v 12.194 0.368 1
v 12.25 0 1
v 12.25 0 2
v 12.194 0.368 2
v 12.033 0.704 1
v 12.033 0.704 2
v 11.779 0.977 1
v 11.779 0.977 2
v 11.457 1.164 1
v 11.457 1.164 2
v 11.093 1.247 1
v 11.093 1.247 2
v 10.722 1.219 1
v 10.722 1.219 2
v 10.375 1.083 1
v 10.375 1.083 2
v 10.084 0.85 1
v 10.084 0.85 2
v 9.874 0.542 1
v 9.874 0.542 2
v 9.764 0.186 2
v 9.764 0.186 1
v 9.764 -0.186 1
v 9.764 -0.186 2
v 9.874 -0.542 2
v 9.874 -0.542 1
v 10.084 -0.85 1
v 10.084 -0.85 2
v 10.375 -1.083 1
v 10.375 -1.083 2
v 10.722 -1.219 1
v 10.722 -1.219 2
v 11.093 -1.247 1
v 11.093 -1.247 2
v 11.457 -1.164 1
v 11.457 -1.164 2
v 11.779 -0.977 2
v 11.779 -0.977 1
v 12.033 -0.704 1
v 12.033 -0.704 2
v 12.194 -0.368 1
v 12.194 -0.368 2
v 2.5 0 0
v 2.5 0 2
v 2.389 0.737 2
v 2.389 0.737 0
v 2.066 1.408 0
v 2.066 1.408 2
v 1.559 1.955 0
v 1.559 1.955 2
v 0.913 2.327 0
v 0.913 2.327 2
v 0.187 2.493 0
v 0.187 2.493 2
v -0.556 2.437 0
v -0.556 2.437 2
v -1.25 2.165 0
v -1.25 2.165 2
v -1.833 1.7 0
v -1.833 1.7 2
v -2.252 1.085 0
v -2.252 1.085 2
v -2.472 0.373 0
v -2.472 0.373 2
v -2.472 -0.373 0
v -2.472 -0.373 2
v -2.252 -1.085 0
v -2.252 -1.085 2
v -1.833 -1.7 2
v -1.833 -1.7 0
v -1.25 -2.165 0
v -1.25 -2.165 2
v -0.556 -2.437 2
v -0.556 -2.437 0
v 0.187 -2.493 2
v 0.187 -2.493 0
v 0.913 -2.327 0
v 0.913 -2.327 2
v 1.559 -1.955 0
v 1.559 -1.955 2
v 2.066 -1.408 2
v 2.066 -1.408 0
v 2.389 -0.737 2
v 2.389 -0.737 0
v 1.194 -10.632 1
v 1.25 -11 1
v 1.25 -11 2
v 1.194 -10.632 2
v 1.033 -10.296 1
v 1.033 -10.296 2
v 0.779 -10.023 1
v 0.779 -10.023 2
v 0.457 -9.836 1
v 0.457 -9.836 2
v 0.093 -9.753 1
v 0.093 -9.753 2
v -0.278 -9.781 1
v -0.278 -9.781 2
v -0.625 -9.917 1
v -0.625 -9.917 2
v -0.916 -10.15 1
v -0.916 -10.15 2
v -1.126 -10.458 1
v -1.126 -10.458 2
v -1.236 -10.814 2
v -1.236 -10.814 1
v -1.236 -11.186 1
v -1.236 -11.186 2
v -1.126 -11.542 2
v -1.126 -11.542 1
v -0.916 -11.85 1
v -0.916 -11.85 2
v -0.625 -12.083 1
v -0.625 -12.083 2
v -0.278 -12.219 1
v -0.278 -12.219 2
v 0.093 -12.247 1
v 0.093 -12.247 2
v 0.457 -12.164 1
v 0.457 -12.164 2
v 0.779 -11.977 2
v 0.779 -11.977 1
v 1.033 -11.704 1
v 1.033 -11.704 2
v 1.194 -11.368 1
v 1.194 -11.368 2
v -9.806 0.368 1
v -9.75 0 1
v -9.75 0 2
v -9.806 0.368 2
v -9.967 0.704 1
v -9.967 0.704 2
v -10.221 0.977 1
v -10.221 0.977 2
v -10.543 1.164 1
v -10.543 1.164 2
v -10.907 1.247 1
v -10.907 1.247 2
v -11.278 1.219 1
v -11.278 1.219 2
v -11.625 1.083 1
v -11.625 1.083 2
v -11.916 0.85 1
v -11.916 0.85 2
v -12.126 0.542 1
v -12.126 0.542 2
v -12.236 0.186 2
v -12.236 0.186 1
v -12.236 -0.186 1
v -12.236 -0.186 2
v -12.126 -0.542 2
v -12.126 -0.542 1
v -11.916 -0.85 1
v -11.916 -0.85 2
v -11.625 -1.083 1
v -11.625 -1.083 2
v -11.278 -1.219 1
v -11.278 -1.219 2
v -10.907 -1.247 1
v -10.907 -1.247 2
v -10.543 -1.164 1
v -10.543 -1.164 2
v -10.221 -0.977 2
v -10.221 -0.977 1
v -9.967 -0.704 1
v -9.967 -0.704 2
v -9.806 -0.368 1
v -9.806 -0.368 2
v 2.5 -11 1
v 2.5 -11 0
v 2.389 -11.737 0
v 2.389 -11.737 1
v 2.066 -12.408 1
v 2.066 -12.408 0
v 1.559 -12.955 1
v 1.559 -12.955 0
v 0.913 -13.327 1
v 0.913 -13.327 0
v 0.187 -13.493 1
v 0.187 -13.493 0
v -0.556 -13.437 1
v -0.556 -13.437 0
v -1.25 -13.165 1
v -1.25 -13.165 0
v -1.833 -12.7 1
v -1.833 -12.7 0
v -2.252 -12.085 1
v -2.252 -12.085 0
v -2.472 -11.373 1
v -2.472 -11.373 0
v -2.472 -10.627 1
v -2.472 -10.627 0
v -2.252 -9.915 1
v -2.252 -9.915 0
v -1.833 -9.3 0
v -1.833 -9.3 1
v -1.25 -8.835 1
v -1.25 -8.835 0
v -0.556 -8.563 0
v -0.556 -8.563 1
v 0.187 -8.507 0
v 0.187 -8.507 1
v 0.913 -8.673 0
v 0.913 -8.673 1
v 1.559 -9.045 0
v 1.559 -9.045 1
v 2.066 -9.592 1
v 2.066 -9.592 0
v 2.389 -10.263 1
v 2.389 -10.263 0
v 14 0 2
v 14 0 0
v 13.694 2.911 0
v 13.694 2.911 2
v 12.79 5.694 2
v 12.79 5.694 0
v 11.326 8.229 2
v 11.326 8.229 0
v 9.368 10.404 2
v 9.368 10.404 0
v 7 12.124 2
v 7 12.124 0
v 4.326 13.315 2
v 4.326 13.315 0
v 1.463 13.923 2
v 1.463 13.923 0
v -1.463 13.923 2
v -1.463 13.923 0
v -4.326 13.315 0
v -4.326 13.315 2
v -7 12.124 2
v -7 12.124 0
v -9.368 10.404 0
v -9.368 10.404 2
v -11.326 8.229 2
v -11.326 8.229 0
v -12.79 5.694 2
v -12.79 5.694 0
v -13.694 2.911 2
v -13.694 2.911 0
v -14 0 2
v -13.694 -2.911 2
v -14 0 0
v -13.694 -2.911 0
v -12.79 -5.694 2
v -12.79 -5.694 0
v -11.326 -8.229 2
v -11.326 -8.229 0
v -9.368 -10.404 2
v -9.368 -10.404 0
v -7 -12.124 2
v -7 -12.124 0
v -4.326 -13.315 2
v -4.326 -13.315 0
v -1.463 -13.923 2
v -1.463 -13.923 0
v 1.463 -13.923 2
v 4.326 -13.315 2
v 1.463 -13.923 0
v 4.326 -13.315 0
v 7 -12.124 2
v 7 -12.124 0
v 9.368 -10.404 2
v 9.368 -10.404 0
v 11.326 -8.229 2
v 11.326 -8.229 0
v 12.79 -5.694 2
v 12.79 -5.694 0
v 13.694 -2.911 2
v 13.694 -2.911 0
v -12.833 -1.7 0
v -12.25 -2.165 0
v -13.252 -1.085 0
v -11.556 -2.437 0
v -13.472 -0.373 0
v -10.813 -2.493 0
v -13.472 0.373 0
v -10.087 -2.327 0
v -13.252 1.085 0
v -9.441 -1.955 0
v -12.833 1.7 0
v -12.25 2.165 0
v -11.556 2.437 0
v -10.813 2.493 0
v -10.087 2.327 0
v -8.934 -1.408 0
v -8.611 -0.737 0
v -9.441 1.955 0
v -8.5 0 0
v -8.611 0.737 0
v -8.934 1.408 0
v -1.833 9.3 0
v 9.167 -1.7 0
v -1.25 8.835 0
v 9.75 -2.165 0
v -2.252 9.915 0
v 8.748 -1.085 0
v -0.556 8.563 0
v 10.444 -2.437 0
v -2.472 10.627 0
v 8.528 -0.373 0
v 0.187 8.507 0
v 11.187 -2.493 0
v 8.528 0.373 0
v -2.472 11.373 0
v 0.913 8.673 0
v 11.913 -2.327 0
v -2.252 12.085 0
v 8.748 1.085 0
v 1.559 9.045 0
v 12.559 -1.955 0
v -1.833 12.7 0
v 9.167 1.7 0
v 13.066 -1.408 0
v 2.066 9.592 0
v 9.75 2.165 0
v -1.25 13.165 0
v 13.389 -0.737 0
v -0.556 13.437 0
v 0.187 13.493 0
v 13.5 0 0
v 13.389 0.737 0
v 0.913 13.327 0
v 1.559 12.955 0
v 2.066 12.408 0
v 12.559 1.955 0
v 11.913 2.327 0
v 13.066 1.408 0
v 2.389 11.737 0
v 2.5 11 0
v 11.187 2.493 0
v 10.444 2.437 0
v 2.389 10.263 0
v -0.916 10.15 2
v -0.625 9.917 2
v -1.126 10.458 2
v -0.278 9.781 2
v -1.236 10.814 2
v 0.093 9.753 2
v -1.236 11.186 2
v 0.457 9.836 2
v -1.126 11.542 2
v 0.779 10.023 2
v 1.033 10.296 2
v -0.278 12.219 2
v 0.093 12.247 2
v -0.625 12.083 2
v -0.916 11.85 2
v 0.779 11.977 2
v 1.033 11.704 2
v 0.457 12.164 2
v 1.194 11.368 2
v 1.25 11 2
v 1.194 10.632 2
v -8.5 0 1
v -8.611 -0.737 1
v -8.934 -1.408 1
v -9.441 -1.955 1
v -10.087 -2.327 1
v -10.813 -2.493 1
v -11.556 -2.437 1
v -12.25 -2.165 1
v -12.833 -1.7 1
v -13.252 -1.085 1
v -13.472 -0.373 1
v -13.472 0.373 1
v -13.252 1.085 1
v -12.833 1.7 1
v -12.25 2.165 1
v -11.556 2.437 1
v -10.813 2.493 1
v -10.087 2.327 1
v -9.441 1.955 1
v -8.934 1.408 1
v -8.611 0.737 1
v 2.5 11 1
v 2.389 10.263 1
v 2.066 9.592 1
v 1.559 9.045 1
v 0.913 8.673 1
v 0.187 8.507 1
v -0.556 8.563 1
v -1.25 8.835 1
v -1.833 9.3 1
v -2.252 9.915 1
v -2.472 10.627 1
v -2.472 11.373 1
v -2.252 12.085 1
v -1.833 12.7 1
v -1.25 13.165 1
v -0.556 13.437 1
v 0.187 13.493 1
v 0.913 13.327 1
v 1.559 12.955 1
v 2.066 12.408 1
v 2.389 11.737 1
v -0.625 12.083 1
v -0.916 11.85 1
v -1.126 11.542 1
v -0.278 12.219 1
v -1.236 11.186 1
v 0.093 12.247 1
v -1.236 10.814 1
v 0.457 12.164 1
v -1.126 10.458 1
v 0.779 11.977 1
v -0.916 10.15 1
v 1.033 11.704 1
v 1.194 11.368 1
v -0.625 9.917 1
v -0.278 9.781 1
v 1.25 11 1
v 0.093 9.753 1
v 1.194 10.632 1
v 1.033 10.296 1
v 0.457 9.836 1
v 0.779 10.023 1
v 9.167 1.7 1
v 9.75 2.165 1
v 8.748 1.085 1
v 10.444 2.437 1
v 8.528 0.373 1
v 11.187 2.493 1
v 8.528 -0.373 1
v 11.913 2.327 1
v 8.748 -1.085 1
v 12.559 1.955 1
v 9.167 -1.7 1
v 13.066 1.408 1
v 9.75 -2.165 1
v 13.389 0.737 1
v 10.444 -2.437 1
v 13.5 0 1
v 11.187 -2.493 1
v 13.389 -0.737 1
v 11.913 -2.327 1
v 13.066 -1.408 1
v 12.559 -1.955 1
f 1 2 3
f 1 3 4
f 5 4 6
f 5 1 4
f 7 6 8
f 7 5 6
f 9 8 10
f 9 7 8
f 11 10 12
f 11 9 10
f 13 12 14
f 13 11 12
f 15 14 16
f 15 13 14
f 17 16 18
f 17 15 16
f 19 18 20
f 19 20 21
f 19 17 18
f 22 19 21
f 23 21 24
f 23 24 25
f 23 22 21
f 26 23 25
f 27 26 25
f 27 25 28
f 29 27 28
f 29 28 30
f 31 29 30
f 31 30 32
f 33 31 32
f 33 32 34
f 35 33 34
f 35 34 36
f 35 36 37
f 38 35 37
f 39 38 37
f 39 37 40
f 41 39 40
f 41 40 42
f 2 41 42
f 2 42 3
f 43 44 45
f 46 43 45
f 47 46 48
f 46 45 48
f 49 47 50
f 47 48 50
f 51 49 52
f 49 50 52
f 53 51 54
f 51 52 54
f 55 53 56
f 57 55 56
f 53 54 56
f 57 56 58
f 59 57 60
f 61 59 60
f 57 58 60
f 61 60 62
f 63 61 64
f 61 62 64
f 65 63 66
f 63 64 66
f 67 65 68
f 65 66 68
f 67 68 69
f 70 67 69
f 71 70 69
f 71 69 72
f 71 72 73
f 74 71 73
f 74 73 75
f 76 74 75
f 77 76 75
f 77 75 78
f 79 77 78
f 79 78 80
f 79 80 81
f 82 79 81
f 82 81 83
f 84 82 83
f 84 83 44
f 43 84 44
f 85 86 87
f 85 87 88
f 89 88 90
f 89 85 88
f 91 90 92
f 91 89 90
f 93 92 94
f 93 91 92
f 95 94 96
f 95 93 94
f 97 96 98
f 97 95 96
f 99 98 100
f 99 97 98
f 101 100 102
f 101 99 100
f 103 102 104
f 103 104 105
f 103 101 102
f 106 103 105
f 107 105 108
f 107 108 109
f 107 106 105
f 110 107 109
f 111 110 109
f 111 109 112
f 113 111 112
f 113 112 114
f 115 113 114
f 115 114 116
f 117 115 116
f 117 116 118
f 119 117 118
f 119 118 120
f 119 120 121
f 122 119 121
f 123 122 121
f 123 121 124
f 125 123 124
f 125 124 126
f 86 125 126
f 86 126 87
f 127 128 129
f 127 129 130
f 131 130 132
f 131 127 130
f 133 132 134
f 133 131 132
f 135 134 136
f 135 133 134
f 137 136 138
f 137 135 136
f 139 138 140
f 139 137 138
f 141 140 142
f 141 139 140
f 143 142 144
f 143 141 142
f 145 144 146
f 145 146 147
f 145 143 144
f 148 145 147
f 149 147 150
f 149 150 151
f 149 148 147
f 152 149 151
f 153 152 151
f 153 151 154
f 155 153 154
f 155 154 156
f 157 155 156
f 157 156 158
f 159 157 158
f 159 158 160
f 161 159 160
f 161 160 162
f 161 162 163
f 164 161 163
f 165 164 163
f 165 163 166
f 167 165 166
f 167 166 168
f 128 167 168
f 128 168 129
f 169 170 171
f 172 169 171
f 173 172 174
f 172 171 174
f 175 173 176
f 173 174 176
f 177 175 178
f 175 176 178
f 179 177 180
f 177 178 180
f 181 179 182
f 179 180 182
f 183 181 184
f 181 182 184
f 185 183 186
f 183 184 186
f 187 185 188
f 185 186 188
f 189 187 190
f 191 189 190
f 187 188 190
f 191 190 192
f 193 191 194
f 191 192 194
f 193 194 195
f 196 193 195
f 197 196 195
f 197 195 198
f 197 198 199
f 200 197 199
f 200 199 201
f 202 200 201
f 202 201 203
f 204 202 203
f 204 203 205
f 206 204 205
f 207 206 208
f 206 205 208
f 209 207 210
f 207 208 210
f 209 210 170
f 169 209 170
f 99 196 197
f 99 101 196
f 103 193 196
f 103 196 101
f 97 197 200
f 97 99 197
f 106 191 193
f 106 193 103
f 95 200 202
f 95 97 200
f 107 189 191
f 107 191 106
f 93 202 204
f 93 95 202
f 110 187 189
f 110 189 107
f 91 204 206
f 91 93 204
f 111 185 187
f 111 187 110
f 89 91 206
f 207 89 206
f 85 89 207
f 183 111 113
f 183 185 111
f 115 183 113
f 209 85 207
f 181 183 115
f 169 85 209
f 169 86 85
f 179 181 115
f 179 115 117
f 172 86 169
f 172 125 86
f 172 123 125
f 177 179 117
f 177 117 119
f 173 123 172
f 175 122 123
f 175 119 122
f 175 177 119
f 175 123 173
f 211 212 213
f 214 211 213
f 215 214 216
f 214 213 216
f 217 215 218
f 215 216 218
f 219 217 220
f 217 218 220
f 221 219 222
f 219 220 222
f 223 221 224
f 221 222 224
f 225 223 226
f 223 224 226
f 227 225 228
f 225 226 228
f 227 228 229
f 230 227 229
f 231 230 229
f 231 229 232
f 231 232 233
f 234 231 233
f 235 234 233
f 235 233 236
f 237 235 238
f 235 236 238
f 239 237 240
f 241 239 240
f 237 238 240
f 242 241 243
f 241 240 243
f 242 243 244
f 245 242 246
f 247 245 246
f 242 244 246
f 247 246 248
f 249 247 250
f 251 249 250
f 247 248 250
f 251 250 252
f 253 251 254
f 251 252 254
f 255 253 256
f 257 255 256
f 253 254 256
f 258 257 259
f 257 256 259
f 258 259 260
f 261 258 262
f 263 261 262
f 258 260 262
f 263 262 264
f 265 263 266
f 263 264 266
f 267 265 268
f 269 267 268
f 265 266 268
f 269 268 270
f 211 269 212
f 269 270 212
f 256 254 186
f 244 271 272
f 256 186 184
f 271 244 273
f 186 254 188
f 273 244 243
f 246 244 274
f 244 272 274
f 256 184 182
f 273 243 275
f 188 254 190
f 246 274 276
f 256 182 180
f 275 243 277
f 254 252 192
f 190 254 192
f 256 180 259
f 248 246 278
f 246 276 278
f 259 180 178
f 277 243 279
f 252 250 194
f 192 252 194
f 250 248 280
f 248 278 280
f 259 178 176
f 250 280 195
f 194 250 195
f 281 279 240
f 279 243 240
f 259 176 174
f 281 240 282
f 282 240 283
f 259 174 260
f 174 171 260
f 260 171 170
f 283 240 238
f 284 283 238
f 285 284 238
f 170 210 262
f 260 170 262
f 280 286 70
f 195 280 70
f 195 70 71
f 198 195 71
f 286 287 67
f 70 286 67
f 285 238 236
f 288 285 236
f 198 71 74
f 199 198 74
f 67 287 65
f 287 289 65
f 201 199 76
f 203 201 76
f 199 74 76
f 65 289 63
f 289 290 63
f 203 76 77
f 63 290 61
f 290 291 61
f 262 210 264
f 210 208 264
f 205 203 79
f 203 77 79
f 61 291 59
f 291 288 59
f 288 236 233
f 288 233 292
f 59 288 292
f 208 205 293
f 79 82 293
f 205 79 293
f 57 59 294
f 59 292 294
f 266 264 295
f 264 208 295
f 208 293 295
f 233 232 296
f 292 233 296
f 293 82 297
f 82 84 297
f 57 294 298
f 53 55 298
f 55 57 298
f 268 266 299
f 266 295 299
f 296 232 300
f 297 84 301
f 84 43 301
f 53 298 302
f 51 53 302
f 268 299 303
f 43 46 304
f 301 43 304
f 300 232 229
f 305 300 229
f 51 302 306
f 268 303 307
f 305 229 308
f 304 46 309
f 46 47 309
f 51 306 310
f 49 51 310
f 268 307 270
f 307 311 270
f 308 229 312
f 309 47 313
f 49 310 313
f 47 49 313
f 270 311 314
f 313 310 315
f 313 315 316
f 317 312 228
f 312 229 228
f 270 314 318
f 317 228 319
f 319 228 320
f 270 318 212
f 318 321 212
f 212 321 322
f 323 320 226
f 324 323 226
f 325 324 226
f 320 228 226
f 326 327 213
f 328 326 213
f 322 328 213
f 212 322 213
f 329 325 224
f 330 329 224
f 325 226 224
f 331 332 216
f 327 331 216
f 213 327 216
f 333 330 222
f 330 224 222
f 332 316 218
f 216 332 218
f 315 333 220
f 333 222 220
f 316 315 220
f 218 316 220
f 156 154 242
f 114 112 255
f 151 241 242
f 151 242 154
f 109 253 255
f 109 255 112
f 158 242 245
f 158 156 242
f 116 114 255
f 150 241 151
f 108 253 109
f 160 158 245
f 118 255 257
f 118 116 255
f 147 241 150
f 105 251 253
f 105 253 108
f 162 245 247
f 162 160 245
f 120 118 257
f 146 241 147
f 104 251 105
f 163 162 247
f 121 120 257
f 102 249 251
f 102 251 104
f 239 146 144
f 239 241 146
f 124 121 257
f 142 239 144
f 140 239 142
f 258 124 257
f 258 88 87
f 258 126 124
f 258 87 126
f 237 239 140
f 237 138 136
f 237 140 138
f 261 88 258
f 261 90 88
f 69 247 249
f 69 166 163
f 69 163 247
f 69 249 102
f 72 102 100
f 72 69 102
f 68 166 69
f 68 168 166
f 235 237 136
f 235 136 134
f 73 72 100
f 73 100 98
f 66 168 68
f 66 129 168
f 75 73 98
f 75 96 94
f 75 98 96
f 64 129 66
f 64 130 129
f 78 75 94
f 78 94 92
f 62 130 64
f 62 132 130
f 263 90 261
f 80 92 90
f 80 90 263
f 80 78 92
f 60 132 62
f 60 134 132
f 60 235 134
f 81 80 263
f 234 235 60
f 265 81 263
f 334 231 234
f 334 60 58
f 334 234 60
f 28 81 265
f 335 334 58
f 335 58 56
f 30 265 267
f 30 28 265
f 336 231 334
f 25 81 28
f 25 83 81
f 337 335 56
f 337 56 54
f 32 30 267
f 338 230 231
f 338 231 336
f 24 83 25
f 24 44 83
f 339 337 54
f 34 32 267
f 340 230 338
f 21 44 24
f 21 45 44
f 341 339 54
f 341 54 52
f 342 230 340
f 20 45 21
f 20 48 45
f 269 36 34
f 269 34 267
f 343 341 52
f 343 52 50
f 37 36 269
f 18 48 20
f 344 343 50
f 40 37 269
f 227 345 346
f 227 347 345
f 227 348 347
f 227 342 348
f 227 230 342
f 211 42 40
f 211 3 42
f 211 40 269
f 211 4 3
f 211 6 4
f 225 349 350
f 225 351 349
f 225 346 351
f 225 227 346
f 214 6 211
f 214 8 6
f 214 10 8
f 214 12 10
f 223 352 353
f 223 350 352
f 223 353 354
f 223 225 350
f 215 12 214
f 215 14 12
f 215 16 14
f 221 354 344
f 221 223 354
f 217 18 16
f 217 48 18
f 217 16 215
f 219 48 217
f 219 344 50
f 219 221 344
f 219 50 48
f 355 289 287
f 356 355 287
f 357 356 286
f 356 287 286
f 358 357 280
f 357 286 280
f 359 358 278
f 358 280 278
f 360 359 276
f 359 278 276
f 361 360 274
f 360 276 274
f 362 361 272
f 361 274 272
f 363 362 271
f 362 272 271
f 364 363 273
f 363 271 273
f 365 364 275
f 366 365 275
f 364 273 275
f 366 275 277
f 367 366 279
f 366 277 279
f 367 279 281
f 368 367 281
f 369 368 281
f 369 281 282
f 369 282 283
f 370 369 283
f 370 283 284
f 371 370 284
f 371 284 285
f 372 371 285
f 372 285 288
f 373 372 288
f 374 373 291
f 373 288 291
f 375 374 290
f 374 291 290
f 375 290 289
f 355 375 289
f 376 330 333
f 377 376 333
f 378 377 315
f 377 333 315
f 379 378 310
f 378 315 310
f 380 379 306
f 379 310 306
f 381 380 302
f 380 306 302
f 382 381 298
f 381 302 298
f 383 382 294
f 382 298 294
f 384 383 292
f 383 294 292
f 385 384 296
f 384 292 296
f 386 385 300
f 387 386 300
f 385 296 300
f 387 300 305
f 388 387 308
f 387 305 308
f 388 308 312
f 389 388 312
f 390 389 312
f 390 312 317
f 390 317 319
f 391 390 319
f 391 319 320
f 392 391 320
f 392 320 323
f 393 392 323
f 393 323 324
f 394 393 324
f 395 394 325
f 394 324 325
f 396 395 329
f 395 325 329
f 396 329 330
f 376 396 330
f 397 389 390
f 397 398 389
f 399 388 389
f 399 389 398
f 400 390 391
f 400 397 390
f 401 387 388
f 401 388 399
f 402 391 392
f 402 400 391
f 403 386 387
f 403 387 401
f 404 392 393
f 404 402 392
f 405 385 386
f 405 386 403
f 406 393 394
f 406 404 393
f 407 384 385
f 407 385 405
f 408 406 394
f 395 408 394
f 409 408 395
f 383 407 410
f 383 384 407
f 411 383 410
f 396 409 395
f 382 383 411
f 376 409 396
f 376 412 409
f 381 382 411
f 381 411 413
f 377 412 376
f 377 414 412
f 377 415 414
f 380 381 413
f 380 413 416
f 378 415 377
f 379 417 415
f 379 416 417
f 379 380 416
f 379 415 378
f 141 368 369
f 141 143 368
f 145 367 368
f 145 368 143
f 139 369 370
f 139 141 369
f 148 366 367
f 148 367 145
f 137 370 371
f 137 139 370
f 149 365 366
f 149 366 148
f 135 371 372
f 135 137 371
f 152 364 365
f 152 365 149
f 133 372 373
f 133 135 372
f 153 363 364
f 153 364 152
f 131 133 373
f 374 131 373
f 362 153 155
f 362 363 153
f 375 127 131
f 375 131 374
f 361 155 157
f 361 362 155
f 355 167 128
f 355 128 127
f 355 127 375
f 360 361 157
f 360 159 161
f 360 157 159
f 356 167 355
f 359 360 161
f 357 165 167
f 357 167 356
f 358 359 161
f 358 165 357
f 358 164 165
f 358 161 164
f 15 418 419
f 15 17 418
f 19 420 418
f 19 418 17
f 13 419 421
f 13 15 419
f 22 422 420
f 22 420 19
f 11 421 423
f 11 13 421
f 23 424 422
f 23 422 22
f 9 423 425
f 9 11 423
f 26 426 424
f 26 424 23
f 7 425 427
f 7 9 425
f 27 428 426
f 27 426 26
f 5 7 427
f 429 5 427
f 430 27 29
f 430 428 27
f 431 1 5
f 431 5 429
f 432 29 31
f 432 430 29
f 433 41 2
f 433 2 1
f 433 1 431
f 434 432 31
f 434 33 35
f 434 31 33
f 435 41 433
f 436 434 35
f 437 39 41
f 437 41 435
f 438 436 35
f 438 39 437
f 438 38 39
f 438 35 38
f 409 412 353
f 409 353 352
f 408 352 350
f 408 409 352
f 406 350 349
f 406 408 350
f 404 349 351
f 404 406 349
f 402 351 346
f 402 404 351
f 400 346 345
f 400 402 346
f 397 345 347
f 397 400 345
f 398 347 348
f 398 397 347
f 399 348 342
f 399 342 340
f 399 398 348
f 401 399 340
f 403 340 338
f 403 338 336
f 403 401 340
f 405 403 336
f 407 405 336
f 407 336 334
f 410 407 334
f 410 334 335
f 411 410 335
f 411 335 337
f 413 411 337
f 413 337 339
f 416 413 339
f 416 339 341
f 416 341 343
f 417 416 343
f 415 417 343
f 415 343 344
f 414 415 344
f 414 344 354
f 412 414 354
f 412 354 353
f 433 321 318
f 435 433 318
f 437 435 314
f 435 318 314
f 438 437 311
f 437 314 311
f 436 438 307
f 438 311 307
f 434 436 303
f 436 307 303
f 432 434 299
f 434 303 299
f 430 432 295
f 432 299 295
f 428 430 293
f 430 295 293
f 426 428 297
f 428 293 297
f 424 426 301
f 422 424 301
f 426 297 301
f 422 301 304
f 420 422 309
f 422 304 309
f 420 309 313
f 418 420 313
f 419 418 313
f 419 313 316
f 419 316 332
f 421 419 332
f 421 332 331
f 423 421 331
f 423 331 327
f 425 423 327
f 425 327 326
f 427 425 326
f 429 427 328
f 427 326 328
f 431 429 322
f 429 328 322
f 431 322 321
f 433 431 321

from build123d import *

# Parameters (mm, degrees)
SKETCH_R        = 14
SKETCH_R_2      = 1.25
PAD_DEPTH       = 2
SKETCH002_R     = 2.5
POCKET_DEPTH    = 9
SKETCH003_R     = 2.5
POCKET001_DEPTH = 1


with BuildPart() as part:
    # Sketch → Pad (new body)
    with BuildSketch(Plane.XY):
        Circle(SKETCH_R)
        with Locations((0, 11)):
            Circle(SKETCH_R_2, mode=Mode.SUBTRACT)
        with Locations((-11, 0)):
            Circle(SKETCH_R_2, mode=Mode.SUBTRACT)
        with Locations((0, -11)):
            Circle(SKETCH_R_2, mode=Mode.SUBTRACT)
        with Locations((11, 0)):
            Circle(SKETCH_R_2, mode=Mode.SUBTRACT)
    extrude(amount=PAD_DEPTH)

    # Sketch002 (on Face7 of Pad) → Pocket (cut)
    with BuildSketch(Plane.XY.offset(2)):
        Circle(SKETCH002_R)
    extrude(amount=-POCKET_DEPTH, mode=Mode.SUBTRACT)

    # Sketch003 (on Face2 of Pocket) → Pocket001 (cut)
    with BuildSketch(Plane(origin=(0, 0, 0), x_dir=(1, 0, 0), z_dir=(0, 0, -1))):
        with Locations((0, 11)):
            Circle(SKETCH003_R)
        with Locations((11, 0)):
            Circle(SKETCH003_R)
        with Locations((0, -11)):
            Circle(SKETCH003_R)
        with Locations((-11, 0)):
            Circle(SKETCH003_R)
    extrude(amount=-POCKET001_DEPTH, mode=Mode.SUBTRACT)


solid = part.part
